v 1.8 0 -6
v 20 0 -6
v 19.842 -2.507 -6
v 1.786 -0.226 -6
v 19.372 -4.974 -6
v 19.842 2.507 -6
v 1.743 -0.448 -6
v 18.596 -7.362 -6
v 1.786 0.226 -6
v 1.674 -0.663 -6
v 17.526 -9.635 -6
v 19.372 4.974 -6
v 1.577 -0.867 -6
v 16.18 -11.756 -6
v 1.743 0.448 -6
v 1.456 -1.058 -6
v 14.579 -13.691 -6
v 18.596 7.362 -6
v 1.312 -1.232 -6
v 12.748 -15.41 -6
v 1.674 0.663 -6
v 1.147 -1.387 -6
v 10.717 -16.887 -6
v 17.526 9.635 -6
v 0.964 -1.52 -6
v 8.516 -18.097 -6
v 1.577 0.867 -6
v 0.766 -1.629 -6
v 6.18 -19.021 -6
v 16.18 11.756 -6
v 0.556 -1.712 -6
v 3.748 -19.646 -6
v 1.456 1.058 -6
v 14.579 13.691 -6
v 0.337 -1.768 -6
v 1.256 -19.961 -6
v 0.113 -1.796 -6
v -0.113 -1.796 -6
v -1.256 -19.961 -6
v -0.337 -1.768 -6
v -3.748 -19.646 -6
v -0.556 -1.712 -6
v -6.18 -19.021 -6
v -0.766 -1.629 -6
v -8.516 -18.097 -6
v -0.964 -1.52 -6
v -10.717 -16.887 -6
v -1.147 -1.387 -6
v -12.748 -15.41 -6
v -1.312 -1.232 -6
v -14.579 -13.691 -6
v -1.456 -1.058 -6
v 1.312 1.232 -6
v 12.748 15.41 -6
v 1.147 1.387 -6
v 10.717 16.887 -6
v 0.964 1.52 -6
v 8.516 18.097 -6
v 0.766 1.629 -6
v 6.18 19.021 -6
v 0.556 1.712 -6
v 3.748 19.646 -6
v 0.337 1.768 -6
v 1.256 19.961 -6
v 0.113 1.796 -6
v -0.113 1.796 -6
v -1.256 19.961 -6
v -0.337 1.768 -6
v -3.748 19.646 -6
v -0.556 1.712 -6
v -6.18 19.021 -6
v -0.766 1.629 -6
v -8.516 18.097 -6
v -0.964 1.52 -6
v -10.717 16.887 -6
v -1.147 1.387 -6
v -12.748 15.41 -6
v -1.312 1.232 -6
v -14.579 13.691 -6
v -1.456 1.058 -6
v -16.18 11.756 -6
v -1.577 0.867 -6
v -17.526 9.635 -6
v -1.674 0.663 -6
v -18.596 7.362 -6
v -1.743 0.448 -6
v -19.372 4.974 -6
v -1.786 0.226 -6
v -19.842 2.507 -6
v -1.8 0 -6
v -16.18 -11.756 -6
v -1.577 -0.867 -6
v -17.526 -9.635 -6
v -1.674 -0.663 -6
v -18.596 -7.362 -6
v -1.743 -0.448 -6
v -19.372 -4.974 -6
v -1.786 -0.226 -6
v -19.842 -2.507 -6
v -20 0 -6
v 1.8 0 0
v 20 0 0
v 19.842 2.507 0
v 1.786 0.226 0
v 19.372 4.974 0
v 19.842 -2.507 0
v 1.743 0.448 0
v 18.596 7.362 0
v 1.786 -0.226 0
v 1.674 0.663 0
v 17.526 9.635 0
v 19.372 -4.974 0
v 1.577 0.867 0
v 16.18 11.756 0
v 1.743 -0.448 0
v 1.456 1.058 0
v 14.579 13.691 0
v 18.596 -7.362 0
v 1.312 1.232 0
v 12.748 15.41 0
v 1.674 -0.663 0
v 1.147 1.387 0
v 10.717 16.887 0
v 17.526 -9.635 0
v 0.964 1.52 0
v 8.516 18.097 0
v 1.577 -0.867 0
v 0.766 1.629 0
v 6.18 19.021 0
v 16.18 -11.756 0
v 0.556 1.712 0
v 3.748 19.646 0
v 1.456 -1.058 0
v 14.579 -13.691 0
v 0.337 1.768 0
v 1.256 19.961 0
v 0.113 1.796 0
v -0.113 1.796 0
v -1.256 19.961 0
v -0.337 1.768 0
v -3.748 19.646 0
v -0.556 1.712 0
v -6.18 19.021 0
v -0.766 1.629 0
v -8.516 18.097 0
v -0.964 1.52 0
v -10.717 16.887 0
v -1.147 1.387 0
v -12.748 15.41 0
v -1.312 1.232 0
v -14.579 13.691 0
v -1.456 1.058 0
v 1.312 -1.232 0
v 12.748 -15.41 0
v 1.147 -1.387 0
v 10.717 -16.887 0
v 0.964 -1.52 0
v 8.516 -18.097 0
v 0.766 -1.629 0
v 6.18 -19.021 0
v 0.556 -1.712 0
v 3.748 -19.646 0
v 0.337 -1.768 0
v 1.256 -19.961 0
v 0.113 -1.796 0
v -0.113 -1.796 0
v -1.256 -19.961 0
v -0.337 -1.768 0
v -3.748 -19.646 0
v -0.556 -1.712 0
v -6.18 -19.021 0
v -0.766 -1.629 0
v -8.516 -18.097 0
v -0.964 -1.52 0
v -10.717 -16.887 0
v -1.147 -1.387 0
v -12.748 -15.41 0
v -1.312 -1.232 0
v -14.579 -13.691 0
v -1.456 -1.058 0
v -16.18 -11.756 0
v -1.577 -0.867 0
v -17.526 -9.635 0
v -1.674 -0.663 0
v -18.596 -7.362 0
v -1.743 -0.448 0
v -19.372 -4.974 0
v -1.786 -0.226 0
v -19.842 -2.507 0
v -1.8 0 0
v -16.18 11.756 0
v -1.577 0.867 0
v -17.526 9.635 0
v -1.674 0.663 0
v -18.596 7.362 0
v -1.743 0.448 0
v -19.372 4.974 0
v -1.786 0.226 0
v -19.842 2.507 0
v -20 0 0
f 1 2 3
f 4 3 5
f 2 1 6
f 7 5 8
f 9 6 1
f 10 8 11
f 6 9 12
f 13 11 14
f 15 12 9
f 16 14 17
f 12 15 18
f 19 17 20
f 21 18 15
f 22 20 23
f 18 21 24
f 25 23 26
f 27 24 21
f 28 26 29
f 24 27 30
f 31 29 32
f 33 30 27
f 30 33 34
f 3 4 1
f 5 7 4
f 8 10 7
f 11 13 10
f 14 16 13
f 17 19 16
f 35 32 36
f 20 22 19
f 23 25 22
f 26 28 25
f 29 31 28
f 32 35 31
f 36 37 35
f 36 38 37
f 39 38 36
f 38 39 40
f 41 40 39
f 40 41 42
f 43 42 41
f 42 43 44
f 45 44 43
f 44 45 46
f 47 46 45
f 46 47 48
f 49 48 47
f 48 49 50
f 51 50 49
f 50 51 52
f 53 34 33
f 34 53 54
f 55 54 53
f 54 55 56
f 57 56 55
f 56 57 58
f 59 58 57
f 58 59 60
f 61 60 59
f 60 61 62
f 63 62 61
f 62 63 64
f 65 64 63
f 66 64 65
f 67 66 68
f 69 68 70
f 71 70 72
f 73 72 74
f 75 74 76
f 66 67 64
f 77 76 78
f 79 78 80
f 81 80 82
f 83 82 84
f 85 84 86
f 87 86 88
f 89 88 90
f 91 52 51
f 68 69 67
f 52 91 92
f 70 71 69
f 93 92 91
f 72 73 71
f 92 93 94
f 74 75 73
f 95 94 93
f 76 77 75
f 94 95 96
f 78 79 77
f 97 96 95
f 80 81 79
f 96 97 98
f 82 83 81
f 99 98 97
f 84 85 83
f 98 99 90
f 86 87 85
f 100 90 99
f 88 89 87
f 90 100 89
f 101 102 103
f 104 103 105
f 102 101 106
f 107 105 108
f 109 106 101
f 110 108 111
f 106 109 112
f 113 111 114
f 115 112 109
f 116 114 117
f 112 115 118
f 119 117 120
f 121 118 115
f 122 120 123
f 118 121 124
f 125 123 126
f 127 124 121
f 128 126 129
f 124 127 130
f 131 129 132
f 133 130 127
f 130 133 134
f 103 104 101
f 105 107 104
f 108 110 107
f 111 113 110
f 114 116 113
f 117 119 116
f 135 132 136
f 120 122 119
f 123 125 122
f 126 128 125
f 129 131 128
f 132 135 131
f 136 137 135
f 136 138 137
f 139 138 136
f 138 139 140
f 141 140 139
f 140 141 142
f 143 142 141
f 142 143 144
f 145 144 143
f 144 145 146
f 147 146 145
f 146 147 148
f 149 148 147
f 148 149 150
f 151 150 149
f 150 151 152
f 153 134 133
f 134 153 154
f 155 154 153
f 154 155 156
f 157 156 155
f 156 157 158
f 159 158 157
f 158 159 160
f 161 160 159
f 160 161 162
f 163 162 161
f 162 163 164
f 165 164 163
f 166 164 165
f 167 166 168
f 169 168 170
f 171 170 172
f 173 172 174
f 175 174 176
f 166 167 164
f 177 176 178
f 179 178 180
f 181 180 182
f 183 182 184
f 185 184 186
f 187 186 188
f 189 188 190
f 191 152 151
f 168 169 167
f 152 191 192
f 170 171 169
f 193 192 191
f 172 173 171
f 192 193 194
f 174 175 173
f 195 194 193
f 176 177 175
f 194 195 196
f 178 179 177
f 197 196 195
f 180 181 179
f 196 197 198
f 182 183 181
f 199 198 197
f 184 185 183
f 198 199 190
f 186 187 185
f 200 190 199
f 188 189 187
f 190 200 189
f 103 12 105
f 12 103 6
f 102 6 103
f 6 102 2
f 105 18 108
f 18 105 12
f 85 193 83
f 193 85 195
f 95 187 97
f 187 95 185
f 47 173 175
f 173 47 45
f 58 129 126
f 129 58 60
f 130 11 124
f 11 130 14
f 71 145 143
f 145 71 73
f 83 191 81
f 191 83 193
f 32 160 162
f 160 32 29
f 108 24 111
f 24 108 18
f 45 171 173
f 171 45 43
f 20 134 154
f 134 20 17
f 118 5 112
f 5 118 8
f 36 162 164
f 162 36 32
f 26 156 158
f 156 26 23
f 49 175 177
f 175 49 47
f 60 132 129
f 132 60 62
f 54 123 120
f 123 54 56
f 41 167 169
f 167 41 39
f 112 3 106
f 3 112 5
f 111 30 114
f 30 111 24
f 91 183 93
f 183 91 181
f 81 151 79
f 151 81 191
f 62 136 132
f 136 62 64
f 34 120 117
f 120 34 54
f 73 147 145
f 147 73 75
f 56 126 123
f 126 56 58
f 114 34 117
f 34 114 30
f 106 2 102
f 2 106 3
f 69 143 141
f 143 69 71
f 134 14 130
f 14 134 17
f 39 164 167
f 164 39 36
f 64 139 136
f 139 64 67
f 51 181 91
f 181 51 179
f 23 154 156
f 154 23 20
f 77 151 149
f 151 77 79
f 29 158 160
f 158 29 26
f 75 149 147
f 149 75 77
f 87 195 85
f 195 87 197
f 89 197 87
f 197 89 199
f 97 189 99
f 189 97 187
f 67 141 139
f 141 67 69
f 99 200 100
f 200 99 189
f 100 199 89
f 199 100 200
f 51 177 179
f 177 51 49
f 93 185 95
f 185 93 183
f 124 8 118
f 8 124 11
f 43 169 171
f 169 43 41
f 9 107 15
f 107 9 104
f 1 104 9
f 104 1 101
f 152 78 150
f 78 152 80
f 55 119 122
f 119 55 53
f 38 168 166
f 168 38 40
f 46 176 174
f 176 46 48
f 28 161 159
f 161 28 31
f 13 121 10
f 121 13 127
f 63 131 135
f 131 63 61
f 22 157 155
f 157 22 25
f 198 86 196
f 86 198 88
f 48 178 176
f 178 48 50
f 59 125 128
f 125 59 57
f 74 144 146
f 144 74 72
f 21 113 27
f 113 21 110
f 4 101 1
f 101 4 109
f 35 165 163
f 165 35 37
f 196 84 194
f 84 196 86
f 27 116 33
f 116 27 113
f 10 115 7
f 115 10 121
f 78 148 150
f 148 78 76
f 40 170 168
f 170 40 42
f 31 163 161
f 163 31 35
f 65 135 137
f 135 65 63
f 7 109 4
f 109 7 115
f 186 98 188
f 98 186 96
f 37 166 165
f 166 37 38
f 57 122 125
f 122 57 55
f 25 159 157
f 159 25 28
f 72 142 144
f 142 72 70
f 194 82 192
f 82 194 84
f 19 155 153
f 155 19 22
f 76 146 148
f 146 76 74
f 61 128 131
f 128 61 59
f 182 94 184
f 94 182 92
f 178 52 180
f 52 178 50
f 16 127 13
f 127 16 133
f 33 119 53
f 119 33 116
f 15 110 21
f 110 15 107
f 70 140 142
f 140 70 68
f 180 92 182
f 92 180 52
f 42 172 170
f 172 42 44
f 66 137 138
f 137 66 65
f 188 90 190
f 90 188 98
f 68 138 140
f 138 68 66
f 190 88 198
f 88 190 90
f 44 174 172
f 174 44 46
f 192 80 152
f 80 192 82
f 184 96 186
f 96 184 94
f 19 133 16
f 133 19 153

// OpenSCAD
$fn = 50;


difference() {
	union() {
		translate(v = [0, 0, -6.0000000000]) {
			cylinder(h = 6, r = 10.0000000000);
		}
		translate(v = [0, 0, -6.0000000000]) {
			cylinder(h = 6, r = 20.0000000000);
		}
	}
	union() {
		#translate(v = [0, 0, -6]) {
			cylinder(h = 6, r = 1.8000000000);
		}
	}
}
